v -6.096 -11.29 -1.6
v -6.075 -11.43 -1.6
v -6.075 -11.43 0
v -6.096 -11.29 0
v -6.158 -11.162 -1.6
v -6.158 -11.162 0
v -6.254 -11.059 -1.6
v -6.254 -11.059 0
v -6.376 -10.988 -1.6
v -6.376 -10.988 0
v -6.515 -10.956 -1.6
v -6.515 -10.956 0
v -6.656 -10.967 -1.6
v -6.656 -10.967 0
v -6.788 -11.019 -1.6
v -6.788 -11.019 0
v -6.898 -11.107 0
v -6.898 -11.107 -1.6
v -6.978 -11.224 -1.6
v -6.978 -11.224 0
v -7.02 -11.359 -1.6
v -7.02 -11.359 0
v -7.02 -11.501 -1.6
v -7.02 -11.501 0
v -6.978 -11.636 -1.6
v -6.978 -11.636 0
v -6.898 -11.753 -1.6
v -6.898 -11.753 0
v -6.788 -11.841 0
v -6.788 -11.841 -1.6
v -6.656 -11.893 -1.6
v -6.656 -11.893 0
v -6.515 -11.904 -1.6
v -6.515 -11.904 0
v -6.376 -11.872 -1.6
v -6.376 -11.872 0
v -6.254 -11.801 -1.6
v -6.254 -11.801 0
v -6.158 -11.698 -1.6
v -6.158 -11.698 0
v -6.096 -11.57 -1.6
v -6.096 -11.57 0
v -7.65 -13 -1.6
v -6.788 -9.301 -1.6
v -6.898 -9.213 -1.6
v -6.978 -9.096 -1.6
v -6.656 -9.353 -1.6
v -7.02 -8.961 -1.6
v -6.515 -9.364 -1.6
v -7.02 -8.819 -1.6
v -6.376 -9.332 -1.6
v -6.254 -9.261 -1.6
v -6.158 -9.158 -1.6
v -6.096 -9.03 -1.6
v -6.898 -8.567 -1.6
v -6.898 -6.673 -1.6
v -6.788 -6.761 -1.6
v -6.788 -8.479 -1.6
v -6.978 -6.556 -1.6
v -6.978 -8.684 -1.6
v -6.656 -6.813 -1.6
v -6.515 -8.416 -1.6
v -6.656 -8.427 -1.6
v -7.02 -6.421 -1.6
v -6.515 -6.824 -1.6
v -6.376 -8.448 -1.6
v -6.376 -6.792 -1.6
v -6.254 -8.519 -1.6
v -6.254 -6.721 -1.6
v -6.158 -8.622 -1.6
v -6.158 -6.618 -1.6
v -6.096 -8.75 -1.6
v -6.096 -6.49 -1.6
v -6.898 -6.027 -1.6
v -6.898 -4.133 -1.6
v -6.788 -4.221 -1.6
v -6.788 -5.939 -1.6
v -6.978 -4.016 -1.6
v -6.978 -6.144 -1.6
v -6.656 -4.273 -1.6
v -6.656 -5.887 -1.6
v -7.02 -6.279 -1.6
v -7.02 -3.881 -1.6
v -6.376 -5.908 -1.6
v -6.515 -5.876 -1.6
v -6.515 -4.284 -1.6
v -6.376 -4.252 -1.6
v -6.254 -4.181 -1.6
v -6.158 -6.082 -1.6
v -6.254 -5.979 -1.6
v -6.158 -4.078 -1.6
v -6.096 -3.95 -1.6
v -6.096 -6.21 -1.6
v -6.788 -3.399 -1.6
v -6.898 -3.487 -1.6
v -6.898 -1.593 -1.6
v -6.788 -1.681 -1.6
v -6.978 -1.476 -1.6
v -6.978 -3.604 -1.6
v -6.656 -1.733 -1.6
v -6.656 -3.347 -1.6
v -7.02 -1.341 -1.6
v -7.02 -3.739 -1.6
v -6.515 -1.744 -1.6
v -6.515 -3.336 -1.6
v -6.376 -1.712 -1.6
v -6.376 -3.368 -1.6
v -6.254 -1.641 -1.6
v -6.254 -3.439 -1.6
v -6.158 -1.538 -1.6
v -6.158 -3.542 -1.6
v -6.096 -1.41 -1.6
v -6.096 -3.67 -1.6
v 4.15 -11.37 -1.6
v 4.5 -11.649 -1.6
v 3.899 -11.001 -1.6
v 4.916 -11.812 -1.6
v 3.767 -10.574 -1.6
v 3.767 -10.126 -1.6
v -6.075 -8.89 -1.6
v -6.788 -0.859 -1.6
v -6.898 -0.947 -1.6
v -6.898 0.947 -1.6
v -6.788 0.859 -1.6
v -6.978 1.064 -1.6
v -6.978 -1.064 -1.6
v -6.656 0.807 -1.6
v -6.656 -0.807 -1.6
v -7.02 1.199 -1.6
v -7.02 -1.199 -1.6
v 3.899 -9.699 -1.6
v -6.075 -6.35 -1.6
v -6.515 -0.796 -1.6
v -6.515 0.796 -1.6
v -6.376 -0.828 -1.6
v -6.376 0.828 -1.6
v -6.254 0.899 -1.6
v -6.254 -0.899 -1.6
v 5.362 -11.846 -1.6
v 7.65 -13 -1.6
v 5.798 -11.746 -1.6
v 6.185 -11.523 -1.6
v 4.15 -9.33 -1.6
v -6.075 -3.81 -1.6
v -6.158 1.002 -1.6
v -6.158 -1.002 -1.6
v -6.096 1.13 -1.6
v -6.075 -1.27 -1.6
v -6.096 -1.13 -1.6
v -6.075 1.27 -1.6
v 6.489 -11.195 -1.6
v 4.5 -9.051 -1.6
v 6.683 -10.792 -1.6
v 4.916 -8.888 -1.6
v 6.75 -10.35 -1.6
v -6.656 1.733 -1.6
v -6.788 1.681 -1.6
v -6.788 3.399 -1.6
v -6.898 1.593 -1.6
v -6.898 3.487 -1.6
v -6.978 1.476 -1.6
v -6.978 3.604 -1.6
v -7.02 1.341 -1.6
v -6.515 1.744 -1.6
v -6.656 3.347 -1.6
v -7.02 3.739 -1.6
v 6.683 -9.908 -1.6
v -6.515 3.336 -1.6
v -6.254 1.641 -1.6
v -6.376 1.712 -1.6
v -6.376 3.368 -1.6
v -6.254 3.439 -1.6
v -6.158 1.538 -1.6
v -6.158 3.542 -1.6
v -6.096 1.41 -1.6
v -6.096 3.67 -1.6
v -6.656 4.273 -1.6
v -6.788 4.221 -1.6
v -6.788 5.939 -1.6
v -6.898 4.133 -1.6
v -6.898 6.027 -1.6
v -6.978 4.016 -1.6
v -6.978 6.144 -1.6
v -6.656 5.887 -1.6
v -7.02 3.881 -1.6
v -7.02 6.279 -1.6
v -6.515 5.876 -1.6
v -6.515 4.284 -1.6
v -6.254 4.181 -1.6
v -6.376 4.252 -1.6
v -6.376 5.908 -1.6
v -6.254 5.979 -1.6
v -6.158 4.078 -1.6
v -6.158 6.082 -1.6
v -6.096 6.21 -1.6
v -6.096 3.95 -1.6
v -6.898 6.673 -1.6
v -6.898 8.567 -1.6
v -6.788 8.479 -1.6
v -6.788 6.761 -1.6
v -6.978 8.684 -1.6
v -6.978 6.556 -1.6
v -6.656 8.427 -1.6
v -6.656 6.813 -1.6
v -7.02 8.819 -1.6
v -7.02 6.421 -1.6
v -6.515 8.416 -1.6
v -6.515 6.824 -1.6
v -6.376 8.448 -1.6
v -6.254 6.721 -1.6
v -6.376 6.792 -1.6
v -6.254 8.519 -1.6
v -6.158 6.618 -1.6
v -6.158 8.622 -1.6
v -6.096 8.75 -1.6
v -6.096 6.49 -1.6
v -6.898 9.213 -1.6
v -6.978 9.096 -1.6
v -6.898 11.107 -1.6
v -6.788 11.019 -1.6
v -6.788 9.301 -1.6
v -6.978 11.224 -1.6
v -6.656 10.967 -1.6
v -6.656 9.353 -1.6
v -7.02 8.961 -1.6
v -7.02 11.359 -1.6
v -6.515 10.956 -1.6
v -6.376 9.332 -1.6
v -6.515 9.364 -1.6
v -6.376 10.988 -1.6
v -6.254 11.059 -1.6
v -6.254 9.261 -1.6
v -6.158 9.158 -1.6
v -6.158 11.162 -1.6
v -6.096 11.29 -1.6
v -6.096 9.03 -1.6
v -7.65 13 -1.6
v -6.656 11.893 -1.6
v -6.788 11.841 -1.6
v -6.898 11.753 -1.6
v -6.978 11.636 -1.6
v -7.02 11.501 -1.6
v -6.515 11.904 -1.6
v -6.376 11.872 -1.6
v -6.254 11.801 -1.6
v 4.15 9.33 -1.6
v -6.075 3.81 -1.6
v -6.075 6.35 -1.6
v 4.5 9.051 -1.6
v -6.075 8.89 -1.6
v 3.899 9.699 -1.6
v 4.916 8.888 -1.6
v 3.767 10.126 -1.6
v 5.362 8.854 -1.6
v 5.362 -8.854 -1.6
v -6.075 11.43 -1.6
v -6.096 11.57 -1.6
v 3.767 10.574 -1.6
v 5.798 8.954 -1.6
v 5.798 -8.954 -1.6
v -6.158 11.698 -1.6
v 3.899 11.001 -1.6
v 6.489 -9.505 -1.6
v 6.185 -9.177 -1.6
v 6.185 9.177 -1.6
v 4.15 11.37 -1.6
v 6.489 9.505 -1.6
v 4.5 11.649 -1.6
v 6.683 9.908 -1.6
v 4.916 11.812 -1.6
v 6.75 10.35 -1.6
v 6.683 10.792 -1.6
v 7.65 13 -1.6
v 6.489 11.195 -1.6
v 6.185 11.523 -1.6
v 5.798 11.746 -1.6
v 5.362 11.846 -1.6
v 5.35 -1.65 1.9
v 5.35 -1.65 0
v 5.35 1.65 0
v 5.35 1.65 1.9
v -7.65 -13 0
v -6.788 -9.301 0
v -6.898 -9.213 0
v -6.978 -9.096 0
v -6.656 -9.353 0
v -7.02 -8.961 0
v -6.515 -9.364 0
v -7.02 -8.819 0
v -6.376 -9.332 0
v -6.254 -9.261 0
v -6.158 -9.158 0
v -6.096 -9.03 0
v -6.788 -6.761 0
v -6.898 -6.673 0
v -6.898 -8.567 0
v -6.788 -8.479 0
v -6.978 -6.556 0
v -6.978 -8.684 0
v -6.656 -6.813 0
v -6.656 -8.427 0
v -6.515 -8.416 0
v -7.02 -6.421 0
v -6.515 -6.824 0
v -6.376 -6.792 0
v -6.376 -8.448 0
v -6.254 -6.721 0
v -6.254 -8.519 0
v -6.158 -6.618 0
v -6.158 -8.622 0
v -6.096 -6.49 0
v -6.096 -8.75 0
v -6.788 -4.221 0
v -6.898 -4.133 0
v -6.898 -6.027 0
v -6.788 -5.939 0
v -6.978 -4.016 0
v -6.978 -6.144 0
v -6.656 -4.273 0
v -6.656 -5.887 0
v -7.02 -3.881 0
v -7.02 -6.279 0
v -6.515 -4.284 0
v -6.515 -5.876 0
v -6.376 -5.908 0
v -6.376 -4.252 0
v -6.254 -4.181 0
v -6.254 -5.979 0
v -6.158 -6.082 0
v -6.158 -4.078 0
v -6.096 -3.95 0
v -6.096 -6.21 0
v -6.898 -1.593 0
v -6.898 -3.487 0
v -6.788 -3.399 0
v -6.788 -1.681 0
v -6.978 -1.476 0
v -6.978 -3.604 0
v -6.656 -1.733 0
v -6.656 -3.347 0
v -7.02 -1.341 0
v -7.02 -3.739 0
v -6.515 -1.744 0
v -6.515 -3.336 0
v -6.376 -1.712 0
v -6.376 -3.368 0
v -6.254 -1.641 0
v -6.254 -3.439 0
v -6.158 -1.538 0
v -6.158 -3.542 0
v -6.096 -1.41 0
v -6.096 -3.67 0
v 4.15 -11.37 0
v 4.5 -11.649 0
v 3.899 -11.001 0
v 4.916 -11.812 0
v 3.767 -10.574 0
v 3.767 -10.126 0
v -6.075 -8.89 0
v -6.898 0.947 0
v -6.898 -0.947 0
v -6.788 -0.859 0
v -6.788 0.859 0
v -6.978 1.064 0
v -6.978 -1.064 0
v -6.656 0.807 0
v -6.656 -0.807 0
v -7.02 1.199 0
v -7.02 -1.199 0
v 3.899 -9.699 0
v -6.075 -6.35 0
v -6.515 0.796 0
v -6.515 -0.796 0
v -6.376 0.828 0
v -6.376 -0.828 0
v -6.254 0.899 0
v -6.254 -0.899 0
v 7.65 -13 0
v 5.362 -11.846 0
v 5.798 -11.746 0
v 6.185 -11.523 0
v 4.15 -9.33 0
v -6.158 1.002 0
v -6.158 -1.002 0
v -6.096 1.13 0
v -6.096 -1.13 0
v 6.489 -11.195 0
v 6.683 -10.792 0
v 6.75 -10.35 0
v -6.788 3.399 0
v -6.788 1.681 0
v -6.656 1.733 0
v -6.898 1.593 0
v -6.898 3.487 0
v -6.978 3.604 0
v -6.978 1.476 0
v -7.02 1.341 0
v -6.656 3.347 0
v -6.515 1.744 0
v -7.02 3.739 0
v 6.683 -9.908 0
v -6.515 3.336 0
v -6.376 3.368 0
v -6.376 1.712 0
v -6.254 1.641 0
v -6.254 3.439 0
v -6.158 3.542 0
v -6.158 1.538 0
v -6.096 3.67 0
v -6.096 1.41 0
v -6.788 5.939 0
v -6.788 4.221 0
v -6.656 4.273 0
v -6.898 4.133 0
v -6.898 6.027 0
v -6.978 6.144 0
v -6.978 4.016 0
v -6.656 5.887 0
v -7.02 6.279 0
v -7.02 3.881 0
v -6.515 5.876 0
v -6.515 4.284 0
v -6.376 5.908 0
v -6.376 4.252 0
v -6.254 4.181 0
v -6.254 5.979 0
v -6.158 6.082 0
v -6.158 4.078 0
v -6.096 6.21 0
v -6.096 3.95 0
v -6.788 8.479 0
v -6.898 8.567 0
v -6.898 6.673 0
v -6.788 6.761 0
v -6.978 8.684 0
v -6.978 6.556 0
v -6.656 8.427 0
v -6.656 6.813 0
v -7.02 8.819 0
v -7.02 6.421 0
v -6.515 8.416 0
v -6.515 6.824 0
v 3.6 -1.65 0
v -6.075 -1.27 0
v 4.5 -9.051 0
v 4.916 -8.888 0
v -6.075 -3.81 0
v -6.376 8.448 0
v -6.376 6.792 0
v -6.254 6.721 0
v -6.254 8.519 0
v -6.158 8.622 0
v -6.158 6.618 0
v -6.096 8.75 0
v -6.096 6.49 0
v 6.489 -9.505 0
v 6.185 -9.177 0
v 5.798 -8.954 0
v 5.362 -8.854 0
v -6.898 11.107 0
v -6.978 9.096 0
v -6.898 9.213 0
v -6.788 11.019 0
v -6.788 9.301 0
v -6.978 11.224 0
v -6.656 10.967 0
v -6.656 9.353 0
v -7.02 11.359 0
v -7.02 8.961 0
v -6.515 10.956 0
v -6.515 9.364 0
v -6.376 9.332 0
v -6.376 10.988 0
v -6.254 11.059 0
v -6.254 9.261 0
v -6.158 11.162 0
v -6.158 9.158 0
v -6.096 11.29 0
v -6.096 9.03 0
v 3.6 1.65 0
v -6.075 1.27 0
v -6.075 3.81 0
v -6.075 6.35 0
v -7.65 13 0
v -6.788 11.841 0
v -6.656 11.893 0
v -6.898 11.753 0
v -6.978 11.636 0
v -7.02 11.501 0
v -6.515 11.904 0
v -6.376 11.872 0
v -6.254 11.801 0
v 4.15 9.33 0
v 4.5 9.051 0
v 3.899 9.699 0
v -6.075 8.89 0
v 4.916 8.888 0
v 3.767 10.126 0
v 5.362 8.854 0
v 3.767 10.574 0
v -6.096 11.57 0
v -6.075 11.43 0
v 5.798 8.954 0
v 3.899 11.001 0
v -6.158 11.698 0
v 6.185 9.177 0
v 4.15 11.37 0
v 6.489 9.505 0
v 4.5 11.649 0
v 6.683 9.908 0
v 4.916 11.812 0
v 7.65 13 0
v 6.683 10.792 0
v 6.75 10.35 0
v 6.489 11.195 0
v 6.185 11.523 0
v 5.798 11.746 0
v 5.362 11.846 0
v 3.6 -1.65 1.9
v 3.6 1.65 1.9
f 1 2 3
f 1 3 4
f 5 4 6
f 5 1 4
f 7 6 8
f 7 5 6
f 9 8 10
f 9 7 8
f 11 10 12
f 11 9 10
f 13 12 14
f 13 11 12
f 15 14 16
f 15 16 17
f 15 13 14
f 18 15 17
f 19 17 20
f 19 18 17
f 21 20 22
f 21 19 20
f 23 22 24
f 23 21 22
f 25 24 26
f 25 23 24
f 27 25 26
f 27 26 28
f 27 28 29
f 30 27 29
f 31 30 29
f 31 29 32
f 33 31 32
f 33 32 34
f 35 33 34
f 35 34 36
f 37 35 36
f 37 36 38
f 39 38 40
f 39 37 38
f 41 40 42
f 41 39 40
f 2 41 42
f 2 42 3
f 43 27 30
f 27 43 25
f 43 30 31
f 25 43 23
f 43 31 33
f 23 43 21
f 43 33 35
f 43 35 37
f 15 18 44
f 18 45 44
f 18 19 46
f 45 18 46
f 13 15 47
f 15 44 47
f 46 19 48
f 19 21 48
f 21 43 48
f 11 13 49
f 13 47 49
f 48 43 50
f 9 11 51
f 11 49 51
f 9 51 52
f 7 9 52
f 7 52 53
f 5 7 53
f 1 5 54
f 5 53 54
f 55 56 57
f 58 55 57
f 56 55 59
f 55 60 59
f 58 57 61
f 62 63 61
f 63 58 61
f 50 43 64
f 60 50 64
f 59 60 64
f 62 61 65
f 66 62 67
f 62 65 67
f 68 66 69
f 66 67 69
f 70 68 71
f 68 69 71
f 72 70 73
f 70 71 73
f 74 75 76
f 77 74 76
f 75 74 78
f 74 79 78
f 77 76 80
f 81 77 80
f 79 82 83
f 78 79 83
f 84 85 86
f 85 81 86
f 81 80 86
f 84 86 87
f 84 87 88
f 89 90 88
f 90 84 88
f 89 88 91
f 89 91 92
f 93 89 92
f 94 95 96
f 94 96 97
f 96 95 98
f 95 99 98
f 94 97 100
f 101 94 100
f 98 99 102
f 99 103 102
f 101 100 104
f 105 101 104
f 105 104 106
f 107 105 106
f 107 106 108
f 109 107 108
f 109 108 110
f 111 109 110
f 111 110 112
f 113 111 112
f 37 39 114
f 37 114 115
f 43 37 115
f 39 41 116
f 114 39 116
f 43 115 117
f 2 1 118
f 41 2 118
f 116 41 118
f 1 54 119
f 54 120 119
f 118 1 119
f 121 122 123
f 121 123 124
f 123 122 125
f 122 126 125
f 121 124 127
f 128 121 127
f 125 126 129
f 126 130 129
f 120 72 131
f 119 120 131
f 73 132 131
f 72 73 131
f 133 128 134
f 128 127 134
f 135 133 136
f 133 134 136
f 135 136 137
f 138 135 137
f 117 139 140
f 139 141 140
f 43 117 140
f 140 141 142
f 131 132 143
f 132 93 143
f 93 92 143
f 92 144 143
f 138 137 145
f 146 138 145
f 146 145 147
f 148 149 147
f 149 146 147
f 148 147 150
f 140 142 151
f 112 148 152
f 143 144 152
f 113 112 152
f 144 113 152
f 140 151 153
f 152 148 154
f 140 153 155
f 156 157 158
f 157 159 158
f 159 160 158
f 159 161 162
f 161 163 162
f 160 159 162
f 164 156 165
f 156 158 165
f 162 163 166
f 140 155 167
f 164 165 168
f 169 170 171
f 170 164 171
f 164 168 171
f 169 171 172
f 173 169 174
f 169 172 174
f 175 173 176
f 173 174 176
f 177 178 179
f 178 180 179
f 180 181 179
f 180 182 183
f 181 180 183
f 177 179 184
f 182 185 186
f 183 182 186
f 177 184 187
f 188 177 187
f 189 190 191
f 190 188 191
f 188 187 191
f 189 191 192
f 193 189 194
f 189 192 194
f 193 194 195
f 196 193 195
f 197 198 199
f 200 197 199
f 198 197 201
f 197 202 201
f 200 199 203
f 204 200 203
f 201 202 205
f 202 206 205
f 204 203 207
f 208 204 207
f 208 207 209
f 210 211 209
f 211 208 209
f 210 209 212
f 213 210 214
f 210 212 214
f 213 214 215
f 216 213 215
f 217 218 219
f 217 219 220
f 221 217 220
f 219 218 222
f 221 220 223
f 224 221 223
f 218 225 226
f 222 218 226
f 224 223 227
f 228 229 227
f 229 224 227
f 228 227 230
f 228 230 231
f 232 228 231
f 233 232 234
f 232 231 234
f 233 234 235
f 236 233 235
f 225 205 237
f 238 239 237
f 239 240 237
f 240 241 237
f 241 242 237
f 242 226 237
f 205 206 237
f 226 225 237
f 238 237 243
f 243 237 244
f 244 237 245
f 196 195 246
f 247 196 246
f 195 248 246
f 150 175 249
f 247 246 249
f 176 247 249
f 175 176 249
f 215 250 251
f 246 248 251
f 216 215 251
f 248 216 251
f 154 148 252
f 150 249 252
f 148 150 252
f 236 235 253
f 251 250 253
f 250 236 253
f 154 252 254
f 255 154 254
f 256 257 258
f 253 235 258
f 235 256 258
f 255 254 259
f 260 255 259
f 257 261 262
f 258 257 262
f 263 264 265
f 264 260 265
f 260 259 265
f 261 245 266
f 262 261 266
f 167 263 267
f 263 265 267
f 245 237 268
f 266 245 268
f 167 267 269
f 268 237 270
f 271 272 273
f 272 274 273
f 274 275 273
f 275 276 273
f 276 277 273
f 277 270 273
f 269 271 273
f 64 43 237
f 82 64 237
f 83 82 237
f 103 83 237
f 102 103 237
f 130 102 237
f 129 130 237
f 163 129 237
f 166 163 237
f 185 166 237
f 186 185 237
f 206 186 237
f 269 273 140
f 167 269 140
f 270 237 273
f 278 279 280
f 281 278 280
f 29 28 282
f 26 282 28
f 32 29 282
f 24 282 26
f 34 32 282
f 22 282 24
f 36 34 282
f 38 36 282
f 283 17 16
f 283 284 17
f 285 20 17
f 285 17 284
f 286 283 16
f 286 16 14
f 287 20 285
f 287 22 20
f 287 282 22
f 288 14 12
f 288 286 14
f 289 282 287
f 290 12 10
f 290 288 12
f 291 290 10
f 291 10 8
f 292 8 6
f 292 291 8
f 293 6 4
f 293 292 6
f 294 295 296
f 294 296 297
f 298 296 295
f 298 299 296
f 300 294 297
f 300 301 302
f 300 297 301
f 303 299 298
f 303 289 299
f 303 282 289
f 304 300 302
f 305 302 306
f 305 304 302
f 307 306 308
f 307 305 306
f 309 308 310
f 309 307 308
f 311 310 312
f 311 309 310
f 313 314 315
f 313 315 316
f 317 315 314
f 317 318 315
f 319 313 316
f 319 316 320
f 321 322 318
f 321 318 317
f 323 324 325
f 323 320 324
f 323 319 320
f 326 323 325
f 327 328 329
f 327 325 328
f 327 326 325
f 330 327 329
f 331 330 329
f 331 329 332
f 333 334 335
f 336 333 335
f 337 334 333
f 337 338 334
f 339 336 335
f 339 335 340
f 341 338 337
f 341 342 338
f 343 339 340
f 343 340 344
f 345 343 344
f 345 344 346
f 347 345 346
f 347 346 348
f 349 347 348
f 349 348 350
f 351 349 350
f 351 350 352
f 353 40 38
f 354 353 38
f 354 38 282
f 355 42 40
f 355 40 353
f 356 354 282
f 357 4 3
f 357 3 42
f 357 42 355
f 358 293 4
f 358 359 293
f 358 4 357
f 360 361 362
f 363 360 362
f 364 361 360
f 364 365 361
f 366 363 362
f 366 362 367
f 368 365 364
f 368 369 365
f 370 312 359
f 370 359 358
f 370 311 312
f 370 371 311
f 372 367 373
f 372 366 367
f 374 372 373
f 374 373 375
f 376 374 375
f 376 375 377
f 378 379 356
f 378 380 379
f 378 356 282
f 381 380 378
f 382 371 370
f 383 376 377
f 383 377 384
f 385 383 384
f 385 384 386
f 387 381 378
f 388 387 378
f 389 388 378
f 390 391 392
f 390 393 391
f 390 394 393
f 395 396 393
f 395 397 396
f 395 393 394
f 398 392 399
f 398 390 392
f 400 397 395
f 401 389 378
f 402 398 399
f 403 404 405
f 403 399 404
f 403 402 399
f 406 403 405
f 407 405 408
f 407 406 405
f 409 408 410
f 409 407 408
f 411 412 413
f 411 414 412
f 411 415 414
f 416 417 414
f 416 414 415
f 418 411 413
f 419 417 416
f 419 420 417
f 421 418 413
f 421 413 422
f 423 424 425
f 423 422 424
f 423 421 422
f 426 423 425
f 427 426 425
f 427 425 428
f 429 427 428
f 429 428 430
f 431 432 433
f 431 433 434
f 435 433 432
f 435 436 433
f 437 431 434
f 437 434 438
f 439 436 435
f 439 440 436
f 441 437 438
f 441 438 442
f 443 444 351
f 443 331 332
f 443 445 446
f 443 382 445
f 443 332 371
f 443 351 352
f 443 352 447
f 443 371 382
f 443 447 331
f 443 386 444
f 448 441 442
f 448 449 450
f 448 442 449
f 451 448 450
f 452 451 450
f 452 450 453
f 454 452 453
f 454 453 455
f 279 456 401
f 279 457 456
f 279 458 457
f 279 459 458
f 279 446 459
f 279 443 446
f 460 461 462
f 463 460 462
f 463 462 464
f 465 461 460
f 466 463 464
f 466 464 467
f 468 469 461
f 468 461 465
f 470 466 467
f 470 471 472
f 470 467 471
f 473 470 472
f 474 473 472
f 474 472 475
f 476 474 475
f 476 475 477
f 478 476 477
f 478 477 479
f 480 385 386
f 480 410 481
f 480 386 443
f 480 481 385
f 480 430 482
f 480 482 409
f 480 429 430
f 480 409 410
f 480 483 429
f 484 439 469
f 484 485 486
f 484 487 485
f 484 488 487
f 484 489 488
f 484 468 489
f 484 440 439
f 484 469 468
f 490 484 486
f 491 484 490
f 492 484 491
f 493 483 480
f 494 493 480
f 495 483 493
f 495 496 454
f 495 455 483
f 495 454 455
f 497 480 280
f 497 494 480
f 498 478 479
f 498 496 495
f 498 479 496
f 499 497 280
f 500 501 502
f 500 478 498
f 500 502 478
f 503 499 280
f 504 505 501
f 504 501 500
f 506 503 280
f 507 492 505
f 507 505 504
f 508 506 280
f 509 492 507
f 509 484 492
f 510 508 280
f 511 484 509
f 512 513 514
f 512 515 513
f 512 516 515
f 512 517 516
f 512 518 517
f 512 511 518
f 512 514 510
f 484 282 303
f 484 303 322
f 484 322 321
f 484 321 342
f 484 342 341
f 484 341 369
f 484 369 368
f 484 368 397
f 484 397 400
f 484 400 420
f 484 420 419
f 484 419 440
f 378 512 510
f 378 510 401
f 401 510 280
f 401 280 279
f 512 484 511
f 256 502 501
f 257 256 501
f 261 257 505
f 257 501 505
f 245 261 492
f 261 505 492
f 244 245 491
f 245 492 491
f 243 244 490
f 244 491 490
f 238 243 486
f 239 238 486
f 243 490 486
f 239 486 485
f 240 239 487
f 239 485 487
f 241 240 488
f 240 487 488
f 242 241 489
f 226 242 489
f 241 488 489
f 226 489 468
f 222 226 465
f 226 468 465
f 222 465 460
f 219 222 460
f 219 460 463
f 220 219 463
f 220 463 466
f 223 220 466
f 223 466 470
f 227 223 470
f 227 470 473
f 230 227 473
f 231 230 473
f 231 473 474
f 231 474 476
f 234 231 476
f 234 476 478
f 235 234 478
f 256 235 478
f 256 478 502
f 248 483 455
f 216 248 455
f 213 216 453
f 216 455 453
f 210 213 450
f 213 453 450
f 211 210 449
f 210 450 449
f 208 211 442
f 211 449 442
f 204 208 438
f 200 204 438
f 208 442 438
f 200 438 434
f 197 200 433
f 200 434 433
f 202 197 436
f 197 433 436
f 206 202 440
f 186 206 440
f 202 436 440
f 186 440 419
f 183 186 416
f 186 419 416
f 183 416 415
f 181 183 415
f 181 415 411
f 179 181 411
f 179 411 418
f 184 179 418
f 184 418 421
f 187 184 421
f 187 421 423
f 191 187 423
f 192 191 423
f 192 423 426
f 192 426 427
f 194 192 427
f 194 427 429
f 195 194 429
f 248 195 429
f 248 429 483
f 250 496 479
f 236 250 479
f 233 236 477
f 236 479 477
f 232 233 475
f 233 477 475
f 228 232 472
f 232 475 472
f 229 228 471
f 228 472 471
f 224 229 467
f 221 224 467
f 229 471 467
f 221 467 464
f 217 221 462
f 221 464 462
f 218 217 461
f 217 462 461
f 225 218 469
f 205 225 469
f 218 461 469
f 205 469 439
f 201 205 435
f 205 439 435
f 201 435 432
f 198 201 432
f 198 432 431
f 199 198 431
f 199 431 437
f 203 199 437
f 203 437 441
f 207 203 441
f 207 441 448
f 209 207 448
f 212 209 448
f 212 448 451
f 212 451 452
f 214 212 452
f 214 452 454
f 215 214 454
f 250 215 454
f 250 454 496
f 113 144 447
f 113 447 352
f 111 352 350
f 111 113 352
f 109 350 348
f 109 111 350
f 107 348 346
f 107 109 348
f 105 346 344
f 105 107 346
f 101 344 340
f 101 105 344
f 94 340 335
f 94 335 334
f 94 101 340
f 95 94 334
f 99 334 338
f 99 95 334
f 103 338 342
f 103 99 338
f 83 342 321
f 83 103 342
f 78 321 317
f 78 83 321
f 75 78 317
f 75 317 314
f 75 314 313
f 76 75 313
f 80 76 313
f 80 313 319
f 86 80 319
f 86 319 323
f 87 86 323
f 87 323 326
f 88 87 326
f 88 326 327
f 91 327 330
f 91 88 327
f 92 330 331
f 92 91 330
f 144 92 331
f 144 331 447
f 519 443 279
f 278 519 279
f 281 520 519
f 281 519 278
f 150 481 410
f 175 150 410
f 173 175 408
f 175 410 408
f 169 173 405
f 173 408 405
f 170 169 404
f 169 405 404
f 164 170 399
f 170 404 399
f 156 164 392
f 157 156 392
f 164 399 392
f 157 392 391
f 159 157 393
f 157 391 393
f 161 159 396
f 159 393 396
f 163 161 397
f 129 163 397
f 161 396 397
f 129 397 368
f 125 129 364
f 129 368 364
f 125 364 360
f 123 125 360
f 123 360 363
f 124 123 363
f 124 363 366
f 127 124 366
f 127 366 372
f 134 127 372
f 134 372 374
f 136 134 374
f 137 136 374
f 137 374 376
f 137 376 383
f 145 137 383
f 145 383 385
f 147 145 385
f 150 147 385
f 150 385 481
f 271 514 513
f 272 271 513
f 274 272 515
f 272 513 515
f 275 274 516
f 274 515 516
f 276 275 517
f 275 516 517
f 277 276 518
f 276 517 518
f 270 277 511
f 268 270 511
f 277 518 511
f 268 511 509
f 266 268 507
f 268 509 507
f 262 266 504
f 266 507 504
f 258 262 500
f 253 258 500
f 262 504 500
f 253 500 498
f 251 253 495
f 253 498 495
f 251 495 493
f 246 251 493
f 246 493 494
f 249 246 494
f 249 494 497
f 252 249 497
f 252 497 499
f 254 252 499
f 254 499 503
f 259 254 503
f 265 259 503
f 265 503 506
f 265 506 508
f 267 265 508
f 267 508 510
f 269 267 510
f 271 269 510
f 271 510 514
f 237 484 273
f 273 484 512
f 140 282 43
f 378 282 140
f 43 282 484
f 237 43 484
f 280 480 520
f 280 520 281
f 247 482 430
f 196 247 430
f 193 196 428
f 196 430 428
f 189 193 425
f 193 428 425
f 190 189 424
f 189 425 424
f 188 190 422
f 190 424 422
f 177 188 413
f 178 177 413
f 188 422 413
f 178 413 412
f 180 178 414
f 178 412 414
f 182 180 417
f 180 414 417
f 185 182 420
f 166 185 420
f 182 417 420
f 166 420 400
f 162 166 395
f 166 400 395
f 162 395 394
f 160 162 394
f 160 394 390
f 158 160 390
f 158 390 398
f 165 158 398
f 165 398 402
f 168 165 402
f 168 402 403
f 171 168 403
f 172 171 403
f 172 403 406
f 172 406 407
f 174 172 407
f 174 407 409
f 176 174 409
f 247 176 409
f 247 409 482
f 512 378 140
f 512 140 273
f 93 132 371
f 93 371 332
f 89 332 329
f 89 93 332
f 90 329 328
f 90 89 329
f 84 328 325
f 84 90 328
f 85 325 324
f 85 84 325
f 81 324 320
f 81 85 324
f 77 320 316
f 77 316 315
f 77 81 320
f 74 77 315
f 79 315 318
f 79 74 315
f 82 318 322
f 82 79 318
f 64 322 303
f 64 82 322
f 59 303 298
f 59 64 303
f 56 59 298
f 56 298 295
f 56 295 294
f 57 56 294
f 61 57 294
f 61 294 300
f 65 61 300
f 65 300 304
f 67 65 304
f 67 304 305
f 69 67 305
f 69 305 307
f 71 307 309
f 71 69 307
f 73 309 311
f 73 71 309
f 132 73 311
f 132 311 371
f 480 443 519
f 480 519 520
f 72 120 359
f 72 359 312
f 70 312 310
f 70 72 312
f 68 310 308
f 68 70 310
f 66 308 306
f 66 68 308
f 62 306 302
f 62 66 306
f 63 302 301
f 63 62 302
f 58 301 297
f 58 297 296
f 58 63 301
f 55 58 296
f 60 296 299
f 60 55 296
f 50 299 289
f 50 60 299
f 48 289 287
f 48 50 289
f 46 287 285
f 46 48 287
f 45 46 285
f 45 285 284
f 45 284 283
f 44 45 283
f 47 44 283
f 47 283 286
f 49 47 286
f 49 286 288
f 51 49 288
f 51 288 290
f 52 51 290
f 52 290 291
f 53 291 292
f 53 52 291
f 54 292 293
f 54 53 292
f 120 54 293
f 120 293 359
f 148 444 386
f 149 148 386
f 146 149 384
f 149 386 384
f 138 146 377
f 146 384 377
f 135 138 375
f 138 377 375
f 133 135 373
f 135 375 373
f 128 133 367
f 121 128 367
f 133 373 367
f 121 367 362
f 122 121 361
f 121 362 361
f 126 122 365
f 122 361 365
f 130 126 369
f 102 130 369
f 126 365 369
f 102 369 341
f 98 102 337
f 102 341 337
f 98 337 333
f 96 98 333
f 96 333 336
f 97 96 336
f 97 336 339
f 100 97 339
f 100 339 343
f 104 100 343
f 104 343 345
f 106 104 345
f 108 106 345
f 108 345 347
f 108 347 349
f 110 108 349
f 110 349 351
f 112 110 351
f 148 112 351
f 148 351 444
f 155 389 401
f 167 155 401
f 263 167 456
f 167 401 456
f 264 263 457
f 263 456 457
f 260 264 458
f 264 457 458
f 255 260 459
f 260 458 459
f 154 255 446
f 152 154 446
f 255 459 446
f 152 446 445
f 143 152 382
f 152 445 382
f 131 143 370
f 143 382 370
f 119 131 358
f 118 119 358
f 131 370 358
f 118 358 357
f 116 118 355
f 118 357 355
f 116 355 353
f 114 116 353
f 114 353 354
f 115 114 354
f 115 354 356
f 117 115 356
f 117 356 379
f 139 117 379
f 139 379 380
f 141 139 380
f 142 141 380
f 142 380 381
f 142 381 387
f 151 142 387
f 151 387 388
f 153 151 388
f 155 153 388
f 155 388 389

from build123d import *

# Parameters (mm, degrees)
SKETCH_1_W             = 15.3
SKETCH_1_H             = 26
EXTRUDE_1_DEPTH        = 1.6
CUT_EXTRUDE_1_REACH    = 17.168
SKETCH_2_R             = 1.5
SKETCH_3_W             = 1.75
SKETCH_3_H             = 3.3
EXTRUDE_2_DEPTH        = 1.9
CUT_EXTRUDE_2_REACH    = 17.203
SKETCH_4_R             = 0.475
PATTERN_LINEAR_1_COUNT = 5
PATTERN_LINEAR_1_PITCH = 2.54
MIRROR_START           = -1.6
MIRROR_1_OUTLINE_R     = 0.475
MIRROR_1_DEPTH         = 1.6


# Read off the part's stored shape, not the designer's step: 镜向1
with BuildPart() as part:
    # 草图1 → 凸台-拉伸1 (new body)
    with BuildSketch(Plane.XY):
        Rectangle(SKETCH_1_W, SKETCH_1_H)
    extrude(amount=-EXTRUDE_1_DEPTH)

    # 草图2 → 切除-拉伸1 (cut, up to next)
    with BuildSketch(Plane.XY, mode=Mode.PRIVATE) as cut_extrude_1_sk1:
        with Locations((5.25, -10.35)):
            Circle(SKETCH_2_R)
    cut_extrude_1_tool1 = extrude(cut_extrude_1_sk1.sketch, amount=-CUT_EXTRUDE_1_REACH, mode=Mode.PRIVATE) & part.part
    # 草图2 → 切除-拉伸1 (cut, up to next)
    with BuildSketch(Plane.XY, mode=Mode.PRIVATE) as cut_extrude_1_sk2:
        with Locations((5.25, 10.35)):
            Circle(SKETCH_2_R)
    cut_extrude_1_tool2 = extrude(cut_extrude_1_sk2.sketch, amount=-CUT_EXTRUDE_1_REACH, mode=Mode.PRIVATE) & part.part
    add(cut_extrude_1_tool1.solids().sort_by_distance((5.25, -10.35, 0))[0], mode=Mode.SUBTRACT)
    add(cut_extrude_1_tool2.solids().sort_by_distance((5.25, 10.35, 0))[0], mode=Mode.SUBTRACT)

    # 草图3 → 凸台-拉伸2 (add)
    with BuildSketch(Plane.XY):
        with Locations((4.475, 0)):
            Rectangle(SKETCH_3_W, SKETCH_3_H)
    extrude(amount=EXTRUDE_2_DEPTH)

    # 草图4 → 切除-拉伸2 (cut, up to next)
    with BuildSketch(Plane.XY, mode=Mode.PRIVATE) as cut_extrude_2_sk1:
        with Locations((-6.55, 1.27)):
            Circle(SKETCH_4_R)
    cut_extrude_2_tool1 = extrude(cut_extrude_2_sk1.sketch, amount=-CUT_EXTRUDE_2_REACH, mode=Mode.PRIVATE) & part.part
    # 草图4 → 切除-拉伸2 (cut, up to next)
    with BuildSketch(Plane.XY, mode=Mode.PRIVATE) as cut_extrude_2_sk2:
        with Locations((-6.55, -1.27)):
            Circle(SKETCH_4_R)
    cut_extrude_2_tool2 = extrude(cut_extrude_2_sk2.sketch, amount=-CUT_EXTRUDE_2_REACH, mode=Mode.PRIVATE) & part.part
    cut_extrude_2_1 = cut_extrude_2_tool1.solids().sort_by_distance((-6.55, 1.27, 0))[0]
    add(cut_extrude_2_1, mode=Mode.SUBTRACT)
    cut_extrude_2_2 = cut_extrude_2_tool2.solids().sort_by_distance((-6.55, -1.27, 0))[0]
    add(cut_extrude_2_2, mode=Mode.SUBTRACT)
    cut_extrude_2 = cut_extrude_2_1 + cut_extrude_2_2  # 切除-拉伸2 as one shape, for the pattern or mirror that repeats it

    # 阵列(线性)1: 切除-拉伸2 ×5
    with Locations(*[(0, i * PATTERN_LINEAR_1_PITCH, 0) for i in range(1, PATTERN_LINEAR_1_COUNT)]):
        add(cut_extrude_2, mode=Mode.SUBTRACT)

    # 镜向1 outline → 镜向1 (cut)
    with BuildSketch(Plane.XY.offset(MIRROR_START)):
        with Locations((-6.55, -6.35)):
            Circle(MIRROR_1_OUTLINE_R)
        with Locations((-6.55, -3.81)):
            Circle(MIRROR_1_OUTLINE_R)
        with Locations((-6.55, -11.43)):
            Circle(MIRROR_1_OUTLINE_R)
        with Locations((-6.55, -8.89)):
            Circle(MIRROR_1_OUTLINE_R)
    extrude(amount=MIRROR_1_DEPTH, mode=Mode.SUBTRACT)


solid = part.part
